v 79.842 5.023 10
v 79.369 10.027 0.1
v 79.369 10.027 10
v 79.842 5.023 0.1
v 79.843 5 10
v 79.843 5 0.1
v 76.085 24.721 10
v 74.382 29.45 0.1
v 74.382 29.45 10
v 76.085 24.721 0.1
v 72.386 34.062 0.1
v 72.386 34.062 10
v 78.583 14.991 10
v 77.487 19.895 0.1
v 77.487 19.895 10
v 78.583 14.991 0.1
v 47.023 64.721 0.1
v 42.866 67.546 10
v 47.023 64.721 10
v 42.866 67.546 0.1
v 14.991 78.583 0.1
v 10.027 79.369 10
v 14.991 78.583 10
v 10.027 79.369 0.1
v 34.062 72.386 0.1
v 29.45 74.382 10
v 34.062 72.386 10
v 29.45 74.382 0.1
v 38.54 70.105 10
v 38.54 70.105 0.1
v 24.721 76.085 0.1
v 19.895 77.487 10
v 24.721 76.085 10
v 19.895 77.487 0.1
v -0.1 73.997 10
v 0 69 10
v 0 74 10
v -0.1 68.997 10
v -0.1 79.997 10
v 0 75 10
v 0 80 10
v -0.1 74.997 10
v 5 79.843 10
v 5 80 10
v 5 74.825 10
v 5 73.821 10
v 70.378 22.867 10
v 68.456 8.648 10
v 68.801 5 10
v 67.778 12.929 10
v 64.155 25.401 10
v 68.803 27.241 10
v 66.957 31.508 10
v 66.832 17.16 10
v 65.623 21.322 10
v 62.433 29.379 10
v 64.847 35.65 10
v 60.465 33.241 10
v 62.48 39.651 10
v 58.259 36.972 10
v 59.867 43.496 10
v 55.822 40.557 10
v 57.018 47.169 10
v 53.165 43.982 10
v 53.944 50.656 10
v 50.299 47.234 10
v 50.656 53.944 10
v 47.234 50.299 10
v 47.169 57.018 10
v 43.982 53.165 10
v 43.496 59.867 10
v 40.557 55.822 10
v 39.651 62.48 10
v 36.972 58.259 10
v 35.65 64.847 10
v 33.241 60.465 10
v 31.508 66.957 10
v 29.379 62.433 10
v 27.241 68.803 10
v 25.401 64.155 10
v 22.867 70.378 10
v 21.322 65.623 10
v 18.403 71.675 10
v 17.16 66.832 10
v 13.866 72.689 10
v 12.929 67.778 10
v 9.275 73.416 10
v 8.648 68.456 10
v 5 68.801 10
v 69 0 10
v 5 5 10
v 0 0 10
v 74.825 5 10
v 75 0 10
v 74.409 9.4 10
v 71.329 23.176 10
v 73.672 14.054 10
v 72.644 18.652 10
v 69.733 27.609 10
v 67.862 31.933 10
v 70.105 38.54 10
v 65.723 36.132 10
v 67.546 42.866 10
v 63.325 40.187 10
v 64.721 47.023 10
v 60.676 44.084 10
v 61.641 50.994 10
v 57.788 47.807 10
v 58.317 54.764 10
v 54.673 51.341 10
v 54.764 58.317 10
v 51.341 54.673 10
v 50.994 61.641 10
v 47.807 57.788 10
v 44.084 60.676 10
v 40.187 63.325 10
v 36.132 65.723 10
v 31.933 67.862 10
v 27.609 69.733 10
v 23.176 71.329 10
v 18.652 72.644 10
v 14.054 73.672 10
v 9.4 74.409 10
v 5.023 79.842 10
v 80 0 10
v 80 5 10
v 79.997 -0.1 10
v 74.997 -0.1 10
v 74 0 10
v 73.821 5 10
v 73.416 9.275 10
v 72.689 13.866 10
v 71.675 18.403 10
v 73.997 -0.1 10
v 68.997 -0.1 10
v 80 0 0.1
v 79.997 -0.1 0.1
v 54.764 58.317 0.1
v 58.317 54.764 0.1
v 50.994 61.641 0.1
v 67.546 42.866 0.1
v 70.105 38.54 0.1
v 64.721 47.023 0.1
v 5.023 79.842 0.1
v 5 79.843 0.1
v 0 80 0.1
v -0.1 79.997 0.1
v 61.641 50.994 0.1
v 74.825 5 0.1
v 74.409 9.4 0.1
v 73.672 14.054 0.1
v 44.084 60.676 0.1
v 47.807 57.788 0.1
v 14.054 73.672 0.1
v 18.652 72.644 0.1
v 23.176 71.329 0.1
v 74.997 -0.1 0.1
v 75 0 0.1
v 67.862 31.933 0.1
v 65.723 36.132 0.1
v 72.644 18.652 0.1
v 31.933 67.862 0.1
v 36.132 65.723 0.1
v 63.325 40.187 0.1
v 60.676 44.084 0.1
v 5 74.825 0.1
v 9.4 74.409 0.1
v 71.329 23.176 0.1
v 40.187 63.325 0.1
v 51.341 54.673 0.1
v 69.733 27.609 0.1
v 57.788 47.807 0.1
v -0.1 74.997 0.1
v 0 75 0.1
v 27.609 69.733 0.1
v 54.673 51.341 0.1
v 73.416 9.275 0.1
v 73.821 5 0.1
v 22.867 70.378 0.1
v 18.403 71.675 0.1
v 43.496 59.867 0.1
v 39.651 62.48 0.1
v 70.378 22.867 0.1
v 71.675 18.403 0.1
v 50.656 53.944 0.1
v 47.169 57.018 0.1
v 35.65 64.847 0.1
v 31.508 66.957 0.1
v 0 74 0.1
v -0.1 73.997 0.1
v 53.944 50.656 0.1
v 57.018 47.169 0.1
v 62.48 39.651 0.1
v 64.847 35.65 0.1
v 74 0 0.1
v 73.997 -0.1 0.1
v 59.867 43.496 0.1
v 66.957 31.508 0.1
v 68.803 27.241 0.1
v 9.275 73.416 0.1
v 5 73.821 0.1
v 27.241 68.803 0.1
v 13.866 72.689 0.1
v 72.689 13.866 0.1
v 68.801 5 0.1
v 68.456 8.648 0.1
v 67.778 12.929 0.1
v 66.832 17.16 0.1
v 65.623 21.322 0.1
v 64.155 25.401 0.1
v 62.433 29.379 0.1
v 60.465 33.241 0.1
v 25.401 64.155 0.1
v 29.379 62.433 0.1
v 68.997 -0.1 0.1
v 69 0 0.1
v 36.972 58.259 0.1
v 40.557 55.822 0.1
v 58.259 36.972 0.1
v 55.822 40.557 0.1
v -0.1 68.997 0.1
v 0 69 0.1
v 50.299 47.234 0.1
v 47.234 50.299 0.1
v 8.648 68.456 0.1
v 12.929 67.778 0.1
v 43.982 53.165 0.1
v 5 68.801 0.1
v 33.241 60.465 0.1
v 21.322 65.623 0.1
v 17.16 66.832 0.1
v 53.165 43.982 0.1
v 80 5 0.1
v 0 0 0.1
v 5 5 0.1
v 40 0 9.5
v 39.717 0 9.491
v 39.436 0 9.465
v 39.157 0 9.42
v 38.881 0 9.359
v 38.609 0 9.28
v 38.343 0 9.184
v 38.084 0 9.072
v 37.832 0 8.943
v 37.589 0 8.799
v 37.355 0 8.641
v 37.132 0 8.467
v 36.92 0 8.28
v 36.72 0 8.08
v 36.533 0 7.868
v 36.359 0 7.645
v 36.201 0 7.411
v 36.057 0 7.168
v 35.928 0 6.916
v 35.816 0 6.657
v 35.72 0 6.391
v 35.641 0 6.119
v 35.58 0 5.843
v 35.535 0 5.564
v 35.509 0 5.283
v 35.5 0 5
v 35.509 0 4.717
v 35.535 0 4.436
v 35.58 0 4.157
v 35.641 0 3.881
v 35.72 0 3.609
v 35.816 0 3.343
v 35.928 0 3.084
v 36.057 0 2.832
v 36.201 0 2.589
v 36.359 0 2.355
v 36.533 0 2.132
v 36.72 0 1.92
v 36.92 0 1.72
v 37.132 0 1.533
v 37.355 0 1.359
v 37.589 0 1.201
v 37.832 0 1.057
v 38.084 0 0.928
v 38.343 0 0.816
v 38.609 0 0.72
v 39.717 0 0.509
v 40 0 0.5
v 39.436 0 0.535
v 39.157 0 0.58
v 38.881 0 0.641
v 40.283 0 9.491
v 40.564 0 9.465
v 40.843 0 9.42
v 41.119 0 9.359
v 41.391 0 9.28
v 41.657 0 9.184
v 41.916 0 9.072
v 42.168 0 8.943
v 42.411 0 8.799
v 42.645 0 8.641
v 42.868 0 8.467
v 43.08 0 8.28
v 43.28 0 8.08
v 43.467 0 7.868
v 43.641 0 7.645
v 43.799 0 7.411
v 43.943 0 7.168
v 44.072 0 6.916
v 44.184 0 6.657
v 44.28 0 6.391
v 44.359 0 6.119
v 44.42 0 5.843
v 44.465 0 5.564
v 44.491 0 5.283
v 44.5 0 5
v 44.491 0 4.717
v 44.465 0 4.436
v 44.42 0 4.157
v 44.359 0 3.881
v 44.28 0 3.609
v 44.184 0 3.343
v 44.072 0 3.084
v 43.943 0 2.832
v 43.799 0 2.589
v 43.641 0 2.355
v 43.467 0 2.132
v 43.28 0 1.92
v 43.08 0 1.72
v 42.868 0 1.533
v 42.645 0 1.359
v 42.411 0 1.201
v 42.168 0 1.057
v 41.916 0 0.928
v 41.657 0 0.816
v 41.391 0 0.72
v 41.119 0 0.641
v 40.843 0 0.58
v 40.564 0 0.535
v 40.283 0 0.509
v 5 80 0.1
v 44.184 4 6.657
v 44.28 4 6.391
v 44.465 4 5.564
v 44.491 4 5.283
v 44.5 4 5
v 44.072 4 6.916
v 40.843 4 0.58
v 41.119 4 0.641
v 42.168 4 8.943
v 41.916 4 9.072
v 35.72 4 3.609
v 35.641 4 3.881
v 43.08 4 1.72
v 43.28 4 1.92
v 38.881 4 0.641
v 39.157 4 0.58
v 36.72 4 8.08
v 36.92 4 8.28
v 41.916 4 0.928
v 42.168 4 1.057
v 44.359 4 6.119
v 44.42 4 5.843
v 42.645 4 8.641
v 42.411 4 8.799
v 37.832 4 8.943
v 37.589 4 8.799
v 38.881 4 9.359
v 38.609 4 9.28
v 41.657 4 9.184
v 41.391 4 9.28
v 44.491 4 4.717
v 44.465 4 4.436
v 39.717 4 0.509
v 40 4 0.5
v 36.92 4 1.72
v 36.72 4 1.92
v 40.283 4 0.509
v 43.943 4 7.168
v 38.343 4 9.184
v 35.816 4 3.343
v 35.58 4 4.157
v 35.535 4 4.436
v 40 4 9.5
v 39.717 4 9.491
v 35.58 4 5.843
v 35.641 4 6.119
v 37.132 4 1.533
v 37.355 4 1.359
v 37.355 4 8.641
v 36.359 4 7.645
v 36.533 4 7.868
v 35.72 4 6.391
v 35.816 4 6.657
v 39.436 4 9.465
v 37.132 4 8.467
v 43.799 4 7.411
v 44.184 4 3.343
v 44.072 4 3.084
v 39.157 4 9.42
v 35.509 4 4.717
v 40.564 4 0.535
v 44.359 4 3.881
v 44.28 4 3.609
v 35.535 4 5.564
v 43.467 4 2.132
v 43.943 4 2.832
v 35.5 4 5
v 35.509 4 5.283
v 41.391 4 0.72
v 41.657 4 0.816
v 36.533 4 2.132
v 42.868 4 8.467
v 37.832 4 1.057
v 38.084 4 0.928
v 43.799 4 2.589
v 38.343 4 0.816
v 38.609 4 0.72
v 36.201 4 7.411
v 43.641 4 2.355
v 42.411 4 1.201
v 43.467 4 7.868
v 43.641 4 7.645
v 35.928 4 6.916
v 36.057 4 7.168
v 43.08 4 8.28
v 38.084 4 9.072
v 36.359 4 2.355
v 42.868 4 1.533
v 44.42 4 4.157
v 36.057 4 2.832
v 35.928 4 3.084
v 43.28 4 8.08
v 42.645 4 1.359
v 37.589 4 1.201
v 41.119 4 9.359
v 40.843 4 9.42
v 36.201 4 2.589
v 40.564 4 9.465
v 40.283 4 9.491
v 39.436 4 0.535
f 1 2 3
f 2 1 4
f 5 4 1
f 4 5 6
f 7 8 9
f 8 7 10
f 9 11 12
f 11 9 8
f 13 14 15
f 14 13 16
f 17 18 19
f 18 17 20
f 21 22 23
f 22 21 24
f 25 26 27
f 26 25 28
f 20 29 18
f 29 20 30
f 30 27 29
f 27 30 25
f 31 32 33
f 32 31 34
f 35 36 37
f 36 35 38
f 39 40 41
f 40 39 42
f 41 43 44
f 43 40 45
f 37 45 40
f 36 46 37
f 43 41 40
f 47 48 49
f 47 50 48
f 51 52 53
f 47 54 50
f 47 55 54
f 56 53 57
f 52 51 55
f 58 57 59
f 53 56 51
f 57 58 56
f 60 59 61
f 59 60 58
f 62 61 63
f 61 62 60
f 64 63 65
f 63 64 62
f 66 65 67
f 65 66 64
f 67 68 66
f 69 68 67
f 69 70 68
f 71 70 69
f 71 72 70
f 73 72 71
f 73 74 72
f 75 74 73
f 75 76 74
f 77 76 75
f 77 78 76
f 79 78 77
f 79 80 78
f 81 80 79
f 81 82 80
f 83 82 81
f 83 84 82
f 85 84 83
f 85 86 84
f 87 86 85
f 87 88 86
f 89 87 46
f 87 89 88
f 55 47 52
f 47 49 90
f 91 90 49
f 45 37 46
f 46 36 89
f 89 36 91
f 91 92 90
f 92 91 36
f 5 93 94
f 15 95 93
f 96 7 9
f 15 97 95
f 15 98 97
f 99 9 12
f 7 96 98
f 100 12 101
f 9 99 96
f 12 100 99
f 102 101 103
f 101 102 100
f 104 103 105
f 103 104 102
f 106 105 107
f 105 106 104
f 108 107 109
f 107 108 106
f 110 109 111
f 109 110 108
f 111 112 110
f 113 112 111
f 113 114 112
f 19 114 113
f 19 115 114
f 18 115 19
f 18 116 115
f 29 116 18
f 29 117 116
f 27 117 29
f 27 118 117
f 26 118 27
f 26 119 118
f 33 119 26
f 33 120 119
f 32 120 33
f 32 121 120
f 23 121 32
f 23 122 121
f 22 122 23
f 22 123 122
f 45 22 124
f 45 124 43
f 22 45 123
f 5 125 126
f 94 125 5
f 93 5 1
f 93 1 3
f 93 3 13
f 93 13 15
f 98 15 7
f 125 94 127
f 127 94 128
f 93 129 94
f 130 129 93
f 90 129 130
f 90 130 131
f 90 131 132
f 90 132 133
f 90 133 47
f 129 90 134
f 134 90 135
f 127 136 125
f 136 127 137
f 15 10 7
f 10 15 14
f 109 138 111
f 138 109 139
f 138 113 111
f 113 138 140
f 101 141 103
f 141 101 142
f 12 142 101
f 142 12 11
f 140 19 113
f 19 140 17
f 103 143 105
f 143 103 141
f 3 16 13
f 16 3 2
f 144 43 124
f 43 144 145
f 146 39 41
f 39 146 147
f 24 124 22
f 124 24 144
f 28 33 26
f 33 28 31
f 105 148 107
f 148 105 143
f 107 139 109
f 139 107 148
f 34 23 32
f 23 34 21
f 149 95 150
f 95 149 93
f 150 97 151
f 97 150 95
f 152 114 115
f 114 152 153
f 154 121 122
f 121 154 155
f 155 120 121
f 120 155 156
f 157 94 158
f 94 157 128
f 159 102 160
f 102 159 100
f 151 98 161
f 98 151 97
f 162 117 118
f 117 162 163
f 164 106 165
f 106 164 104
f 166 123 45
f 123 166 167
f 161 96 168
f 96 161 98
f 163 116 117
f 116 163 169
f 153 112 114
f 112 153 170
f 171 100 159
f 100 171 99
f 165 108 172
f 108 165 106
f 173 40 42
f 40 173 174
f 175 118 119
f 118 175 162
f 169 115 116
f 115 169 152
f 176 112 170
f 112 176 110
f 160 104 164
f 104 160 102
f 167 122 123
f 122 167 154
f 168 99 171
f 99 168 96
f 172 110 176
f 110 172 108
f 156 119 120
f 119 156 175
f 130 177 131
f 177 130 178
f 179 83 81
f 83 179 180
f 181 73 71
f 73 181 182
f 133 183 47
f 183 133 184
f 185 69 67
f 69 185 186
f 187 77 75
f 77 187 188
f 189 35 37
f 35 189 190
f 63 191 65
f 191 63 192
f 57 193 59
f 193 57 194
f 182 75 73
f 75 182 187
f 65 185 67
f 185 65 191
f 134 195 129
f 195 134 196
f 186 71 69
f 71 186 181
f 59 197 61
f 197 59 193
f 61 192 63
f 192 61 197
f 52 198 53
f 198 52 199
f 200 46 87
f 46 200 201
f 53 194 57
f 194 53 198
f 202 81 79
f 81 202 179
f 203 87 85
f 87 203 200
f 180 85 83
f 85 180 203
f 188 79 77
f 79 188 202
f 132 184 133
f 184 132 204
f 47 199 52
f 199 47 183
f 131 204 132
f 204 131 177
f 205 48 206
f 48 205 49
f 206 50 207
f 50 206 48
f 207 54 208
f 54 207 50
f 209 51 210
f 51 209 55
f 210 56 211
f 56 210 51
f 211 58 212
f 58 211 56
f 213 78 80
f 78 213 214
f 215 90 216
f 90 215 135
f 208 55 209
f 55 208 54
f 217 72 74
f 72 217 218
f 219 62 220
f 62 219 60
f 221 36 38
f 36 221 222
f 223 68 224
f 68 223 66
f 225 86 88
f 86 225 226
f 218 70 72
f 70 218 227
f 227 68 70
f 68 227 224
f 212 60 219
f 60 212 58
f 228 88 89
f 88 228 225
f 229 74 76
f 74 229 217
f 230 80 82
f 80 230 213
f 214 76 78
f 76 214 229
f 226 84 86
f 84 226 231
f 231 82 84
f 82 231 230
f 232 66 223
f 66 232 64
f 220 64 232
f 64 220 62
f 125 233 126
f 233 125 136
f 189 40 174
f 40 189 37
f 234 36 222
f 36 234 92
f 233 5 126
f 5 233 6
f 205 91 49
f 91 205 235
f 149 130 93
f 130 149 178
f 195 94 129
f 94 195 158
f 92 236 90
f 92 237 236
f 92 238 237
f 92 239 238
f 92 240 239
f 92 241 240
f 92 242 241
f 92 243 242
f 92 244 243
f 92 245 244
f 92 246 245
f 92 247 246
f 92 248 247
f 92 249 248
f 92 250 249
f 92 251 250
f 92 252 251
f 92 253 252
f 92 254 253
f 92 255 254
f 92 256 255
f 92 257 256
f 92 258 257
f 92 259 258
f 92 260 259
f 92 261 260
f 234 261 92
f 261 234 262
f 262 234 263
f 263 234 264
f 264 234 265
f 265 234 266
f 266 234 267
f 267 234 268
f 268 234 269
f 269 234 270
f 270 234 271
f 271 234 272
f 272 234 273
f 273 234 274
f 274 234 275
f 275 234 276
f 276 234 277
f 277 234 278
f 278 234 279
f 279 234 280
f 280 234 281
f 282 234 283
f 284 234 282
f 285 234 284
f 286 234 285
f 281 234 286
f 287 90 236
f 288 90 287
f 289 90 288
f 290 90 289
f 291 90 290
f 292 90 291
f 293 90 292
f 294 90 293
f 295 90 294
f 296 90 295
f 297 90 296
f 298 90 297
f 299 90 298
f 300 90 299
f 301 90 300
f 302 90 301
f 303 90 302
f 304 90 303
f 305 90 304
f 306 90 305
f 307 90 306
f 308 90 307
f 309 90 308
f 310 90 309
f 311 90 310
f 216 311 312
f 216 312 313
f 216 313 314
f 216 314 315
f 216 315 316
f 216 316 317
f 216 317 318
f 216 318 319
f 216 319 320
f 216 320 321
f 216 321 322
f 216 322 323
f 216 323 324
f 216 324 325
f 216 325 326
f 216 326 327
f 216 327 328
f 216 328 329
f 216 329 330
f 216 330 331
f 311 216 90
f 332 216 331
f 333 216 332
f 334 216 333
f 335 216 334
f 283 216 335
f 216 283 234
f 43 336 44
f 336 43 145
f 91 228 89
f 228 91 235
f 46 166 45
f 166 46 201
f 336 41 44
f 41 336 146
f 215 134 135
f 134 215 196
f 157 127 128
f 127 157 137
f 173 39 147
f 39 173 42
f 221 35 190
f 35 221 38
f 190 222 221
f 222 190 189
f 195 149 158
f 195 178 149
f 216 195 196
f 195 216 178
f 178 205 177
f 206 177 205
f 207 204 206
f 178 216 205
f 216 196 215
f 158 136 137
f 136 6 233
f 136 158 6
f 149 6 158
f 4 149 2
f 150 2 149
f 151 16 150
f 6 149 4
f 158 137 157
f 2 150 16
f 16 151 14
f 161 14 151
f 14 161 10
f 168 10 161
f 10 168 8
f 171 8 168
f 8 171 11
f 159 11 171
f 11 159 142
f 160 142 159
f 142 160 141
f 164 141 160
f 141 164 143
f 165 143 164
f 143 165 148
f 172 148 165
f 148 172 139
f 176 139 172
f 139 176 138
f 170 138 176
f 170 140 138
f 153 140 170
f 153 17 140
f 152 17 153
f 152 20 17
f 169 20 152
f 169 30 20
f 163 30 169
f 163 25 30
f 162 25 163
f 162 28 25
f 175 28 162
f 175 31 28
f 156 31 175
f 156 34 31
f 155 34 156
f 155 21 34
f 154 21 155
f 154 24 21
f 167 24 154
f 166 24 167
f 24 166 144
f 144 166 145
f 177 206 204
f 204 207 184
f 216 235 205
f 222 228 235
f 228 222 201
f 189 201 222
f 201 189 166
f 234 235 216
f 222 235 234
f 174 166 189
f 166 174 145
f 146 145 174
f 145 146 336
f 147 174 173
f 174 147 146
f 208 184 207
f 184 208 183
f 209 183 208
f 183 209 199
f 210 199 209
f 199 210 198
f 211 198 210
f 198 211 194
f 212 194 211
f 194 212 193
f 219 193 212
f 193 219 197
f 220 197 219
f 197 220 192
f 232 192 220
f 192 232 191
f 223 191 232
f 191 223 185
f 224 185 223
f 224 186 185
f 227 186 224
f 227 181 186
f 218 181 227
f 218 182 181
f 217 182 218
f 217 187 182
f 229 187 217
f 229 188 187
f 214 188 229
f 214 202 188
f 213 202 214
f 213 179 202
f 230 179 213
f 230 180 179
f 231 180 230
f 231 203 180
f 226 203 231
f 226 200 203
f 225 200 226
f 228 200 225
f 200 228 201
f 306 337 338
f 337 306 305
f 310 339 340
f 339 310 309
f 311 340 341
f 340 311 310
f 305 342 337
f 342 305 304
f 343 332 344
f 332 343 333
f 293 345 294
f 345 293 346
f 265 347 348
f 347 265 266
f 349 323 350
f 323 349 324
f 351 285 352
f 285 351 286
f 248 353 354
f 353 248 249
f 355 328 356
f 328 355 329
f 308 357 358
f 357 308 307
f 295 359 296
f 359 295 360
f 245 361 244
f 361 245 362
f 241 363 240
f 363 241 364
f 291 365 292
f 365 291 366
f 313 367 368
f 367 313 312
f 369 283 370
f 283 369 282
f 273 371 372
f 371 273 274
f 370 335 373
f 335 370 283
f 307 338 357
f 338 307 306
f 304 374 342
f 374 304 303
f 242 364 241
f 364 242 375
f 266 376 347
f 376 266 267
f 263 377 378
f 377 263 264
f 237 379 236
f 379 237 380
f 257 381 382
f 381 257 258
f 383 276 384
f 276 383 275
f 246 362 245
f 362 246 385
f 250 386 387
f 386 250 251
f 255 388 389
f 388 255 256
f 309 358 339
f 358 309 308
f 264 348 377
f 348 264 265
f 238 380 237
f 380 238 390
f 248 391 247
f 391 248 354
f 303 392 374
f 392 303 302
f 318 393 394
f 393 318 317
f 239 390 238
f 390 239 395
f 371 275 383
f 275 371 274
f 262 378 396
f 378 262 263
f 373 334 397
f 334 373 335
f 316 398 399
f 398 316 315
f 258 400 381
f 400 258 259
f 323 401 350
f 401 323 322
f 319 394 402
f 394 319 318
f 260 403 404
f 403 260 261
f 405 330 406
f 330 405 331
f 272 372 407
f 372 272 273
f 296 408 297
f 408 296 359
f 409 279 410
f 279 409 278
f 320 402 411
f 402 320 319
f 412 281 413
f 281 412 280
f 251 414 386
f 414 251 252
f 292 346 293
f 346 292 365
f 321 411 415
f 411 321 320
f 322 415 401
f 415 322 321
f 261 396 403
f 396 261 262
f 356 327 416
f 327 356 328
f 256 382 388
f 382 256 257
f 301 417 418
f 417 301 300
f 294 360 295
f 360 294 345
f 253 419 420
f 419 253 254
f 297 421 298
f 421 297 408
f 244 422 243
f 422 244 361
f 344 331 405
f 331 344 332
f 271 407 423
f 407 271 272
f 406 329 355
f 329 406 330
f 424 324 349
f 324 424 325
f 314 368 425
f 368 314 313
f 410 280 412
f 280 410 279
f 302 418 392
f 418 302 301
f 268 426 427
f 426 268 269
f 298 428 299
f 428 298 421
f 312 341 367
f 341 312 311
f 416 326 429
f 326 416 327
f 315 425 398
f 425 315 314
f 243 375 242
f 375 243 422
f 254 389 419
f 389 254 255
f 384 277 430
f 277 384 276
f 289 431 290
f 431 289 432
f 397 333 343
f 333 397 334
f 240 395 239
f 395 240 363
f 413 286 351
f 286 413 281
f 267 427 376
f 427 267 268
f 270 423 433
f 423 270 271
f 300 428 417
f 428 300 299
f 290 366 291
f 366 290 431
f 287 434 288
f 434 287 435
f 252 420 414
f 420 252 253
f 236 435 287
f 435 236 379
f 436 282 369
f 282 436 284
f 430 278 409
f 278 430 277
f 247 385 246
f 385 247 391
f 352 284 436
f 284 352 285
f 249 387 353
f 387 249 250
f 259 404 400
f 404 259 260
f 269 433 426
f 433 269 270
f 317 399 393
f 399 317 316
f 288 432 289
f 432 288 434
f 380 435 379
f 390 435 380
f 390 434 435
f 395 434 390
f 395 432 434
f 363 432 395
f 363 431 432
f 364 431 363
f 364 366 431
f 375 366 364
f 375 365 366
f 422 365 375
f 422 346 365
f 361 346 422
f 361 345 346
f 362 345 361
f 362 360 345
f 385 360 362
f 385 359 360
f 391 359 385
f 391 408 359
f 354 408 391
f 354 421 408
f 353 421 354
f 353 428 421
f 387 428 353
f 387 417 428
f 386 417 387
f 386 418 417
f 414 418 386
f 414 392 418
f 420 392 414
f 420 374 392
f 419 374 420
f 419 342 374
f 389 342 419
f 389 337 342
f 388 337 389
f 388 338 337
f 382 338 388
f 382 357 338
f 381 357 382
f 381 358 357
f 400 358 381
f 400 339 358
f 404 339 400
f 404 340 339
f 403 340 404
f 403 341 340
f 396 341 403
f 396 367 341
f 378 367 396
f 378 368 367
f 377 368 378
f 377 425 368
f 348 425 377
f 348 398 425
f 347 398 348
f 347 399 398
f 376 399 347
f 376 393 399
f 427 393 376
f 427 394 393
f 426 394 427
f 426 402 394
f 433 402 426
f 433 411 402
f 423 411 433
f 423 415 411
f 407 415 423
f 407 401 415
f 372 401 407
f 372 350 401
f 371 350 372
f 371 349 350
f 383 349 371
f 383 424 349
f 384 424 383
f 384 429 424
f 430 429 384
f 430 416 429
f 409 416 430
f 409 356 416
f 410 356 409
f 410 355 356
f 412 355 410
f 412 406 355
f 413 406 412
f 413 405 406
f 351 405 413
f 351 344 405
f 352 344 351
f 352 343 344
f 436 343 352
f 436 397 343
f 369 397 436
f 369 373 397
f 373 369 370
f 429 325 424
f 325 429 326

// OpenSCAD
a=80; //radius
b=10; //thickness
s=5;
t=1;
x=4.5; //rad of magnet
y=5;//height of mag
z=8;

$fn=100;
difference(){
difference(){
union(){
cube([a,s,b]);
rotate([0,0,90])translate([0,-s,0])cube([a,s,b]);
//outet ring
difference(){
cylinder(r=a, h=b);
cylinder(r=a-s, h=b+1);
}
//inner ring
difference(){
cylinder(r=a-s-t, h=b);
cylinder(r=a-s-t-s, h=b+1);
}
}
// cut 3/4 of cylinder
translate([0,-a-.1,-.5])cube([a,a,b+1]);
translate([-a,-a,-.5])cube([a,a,b+1]);
translate([-a-.1,0,-.5])cube([a,a,b+1]);
translate([0,0,-9.9])cylinder(r=a+1, h=10);
}
translate([a/2,s-1,b/2])rotate([90,0,0])cylinder(r=x, h=y);
}
